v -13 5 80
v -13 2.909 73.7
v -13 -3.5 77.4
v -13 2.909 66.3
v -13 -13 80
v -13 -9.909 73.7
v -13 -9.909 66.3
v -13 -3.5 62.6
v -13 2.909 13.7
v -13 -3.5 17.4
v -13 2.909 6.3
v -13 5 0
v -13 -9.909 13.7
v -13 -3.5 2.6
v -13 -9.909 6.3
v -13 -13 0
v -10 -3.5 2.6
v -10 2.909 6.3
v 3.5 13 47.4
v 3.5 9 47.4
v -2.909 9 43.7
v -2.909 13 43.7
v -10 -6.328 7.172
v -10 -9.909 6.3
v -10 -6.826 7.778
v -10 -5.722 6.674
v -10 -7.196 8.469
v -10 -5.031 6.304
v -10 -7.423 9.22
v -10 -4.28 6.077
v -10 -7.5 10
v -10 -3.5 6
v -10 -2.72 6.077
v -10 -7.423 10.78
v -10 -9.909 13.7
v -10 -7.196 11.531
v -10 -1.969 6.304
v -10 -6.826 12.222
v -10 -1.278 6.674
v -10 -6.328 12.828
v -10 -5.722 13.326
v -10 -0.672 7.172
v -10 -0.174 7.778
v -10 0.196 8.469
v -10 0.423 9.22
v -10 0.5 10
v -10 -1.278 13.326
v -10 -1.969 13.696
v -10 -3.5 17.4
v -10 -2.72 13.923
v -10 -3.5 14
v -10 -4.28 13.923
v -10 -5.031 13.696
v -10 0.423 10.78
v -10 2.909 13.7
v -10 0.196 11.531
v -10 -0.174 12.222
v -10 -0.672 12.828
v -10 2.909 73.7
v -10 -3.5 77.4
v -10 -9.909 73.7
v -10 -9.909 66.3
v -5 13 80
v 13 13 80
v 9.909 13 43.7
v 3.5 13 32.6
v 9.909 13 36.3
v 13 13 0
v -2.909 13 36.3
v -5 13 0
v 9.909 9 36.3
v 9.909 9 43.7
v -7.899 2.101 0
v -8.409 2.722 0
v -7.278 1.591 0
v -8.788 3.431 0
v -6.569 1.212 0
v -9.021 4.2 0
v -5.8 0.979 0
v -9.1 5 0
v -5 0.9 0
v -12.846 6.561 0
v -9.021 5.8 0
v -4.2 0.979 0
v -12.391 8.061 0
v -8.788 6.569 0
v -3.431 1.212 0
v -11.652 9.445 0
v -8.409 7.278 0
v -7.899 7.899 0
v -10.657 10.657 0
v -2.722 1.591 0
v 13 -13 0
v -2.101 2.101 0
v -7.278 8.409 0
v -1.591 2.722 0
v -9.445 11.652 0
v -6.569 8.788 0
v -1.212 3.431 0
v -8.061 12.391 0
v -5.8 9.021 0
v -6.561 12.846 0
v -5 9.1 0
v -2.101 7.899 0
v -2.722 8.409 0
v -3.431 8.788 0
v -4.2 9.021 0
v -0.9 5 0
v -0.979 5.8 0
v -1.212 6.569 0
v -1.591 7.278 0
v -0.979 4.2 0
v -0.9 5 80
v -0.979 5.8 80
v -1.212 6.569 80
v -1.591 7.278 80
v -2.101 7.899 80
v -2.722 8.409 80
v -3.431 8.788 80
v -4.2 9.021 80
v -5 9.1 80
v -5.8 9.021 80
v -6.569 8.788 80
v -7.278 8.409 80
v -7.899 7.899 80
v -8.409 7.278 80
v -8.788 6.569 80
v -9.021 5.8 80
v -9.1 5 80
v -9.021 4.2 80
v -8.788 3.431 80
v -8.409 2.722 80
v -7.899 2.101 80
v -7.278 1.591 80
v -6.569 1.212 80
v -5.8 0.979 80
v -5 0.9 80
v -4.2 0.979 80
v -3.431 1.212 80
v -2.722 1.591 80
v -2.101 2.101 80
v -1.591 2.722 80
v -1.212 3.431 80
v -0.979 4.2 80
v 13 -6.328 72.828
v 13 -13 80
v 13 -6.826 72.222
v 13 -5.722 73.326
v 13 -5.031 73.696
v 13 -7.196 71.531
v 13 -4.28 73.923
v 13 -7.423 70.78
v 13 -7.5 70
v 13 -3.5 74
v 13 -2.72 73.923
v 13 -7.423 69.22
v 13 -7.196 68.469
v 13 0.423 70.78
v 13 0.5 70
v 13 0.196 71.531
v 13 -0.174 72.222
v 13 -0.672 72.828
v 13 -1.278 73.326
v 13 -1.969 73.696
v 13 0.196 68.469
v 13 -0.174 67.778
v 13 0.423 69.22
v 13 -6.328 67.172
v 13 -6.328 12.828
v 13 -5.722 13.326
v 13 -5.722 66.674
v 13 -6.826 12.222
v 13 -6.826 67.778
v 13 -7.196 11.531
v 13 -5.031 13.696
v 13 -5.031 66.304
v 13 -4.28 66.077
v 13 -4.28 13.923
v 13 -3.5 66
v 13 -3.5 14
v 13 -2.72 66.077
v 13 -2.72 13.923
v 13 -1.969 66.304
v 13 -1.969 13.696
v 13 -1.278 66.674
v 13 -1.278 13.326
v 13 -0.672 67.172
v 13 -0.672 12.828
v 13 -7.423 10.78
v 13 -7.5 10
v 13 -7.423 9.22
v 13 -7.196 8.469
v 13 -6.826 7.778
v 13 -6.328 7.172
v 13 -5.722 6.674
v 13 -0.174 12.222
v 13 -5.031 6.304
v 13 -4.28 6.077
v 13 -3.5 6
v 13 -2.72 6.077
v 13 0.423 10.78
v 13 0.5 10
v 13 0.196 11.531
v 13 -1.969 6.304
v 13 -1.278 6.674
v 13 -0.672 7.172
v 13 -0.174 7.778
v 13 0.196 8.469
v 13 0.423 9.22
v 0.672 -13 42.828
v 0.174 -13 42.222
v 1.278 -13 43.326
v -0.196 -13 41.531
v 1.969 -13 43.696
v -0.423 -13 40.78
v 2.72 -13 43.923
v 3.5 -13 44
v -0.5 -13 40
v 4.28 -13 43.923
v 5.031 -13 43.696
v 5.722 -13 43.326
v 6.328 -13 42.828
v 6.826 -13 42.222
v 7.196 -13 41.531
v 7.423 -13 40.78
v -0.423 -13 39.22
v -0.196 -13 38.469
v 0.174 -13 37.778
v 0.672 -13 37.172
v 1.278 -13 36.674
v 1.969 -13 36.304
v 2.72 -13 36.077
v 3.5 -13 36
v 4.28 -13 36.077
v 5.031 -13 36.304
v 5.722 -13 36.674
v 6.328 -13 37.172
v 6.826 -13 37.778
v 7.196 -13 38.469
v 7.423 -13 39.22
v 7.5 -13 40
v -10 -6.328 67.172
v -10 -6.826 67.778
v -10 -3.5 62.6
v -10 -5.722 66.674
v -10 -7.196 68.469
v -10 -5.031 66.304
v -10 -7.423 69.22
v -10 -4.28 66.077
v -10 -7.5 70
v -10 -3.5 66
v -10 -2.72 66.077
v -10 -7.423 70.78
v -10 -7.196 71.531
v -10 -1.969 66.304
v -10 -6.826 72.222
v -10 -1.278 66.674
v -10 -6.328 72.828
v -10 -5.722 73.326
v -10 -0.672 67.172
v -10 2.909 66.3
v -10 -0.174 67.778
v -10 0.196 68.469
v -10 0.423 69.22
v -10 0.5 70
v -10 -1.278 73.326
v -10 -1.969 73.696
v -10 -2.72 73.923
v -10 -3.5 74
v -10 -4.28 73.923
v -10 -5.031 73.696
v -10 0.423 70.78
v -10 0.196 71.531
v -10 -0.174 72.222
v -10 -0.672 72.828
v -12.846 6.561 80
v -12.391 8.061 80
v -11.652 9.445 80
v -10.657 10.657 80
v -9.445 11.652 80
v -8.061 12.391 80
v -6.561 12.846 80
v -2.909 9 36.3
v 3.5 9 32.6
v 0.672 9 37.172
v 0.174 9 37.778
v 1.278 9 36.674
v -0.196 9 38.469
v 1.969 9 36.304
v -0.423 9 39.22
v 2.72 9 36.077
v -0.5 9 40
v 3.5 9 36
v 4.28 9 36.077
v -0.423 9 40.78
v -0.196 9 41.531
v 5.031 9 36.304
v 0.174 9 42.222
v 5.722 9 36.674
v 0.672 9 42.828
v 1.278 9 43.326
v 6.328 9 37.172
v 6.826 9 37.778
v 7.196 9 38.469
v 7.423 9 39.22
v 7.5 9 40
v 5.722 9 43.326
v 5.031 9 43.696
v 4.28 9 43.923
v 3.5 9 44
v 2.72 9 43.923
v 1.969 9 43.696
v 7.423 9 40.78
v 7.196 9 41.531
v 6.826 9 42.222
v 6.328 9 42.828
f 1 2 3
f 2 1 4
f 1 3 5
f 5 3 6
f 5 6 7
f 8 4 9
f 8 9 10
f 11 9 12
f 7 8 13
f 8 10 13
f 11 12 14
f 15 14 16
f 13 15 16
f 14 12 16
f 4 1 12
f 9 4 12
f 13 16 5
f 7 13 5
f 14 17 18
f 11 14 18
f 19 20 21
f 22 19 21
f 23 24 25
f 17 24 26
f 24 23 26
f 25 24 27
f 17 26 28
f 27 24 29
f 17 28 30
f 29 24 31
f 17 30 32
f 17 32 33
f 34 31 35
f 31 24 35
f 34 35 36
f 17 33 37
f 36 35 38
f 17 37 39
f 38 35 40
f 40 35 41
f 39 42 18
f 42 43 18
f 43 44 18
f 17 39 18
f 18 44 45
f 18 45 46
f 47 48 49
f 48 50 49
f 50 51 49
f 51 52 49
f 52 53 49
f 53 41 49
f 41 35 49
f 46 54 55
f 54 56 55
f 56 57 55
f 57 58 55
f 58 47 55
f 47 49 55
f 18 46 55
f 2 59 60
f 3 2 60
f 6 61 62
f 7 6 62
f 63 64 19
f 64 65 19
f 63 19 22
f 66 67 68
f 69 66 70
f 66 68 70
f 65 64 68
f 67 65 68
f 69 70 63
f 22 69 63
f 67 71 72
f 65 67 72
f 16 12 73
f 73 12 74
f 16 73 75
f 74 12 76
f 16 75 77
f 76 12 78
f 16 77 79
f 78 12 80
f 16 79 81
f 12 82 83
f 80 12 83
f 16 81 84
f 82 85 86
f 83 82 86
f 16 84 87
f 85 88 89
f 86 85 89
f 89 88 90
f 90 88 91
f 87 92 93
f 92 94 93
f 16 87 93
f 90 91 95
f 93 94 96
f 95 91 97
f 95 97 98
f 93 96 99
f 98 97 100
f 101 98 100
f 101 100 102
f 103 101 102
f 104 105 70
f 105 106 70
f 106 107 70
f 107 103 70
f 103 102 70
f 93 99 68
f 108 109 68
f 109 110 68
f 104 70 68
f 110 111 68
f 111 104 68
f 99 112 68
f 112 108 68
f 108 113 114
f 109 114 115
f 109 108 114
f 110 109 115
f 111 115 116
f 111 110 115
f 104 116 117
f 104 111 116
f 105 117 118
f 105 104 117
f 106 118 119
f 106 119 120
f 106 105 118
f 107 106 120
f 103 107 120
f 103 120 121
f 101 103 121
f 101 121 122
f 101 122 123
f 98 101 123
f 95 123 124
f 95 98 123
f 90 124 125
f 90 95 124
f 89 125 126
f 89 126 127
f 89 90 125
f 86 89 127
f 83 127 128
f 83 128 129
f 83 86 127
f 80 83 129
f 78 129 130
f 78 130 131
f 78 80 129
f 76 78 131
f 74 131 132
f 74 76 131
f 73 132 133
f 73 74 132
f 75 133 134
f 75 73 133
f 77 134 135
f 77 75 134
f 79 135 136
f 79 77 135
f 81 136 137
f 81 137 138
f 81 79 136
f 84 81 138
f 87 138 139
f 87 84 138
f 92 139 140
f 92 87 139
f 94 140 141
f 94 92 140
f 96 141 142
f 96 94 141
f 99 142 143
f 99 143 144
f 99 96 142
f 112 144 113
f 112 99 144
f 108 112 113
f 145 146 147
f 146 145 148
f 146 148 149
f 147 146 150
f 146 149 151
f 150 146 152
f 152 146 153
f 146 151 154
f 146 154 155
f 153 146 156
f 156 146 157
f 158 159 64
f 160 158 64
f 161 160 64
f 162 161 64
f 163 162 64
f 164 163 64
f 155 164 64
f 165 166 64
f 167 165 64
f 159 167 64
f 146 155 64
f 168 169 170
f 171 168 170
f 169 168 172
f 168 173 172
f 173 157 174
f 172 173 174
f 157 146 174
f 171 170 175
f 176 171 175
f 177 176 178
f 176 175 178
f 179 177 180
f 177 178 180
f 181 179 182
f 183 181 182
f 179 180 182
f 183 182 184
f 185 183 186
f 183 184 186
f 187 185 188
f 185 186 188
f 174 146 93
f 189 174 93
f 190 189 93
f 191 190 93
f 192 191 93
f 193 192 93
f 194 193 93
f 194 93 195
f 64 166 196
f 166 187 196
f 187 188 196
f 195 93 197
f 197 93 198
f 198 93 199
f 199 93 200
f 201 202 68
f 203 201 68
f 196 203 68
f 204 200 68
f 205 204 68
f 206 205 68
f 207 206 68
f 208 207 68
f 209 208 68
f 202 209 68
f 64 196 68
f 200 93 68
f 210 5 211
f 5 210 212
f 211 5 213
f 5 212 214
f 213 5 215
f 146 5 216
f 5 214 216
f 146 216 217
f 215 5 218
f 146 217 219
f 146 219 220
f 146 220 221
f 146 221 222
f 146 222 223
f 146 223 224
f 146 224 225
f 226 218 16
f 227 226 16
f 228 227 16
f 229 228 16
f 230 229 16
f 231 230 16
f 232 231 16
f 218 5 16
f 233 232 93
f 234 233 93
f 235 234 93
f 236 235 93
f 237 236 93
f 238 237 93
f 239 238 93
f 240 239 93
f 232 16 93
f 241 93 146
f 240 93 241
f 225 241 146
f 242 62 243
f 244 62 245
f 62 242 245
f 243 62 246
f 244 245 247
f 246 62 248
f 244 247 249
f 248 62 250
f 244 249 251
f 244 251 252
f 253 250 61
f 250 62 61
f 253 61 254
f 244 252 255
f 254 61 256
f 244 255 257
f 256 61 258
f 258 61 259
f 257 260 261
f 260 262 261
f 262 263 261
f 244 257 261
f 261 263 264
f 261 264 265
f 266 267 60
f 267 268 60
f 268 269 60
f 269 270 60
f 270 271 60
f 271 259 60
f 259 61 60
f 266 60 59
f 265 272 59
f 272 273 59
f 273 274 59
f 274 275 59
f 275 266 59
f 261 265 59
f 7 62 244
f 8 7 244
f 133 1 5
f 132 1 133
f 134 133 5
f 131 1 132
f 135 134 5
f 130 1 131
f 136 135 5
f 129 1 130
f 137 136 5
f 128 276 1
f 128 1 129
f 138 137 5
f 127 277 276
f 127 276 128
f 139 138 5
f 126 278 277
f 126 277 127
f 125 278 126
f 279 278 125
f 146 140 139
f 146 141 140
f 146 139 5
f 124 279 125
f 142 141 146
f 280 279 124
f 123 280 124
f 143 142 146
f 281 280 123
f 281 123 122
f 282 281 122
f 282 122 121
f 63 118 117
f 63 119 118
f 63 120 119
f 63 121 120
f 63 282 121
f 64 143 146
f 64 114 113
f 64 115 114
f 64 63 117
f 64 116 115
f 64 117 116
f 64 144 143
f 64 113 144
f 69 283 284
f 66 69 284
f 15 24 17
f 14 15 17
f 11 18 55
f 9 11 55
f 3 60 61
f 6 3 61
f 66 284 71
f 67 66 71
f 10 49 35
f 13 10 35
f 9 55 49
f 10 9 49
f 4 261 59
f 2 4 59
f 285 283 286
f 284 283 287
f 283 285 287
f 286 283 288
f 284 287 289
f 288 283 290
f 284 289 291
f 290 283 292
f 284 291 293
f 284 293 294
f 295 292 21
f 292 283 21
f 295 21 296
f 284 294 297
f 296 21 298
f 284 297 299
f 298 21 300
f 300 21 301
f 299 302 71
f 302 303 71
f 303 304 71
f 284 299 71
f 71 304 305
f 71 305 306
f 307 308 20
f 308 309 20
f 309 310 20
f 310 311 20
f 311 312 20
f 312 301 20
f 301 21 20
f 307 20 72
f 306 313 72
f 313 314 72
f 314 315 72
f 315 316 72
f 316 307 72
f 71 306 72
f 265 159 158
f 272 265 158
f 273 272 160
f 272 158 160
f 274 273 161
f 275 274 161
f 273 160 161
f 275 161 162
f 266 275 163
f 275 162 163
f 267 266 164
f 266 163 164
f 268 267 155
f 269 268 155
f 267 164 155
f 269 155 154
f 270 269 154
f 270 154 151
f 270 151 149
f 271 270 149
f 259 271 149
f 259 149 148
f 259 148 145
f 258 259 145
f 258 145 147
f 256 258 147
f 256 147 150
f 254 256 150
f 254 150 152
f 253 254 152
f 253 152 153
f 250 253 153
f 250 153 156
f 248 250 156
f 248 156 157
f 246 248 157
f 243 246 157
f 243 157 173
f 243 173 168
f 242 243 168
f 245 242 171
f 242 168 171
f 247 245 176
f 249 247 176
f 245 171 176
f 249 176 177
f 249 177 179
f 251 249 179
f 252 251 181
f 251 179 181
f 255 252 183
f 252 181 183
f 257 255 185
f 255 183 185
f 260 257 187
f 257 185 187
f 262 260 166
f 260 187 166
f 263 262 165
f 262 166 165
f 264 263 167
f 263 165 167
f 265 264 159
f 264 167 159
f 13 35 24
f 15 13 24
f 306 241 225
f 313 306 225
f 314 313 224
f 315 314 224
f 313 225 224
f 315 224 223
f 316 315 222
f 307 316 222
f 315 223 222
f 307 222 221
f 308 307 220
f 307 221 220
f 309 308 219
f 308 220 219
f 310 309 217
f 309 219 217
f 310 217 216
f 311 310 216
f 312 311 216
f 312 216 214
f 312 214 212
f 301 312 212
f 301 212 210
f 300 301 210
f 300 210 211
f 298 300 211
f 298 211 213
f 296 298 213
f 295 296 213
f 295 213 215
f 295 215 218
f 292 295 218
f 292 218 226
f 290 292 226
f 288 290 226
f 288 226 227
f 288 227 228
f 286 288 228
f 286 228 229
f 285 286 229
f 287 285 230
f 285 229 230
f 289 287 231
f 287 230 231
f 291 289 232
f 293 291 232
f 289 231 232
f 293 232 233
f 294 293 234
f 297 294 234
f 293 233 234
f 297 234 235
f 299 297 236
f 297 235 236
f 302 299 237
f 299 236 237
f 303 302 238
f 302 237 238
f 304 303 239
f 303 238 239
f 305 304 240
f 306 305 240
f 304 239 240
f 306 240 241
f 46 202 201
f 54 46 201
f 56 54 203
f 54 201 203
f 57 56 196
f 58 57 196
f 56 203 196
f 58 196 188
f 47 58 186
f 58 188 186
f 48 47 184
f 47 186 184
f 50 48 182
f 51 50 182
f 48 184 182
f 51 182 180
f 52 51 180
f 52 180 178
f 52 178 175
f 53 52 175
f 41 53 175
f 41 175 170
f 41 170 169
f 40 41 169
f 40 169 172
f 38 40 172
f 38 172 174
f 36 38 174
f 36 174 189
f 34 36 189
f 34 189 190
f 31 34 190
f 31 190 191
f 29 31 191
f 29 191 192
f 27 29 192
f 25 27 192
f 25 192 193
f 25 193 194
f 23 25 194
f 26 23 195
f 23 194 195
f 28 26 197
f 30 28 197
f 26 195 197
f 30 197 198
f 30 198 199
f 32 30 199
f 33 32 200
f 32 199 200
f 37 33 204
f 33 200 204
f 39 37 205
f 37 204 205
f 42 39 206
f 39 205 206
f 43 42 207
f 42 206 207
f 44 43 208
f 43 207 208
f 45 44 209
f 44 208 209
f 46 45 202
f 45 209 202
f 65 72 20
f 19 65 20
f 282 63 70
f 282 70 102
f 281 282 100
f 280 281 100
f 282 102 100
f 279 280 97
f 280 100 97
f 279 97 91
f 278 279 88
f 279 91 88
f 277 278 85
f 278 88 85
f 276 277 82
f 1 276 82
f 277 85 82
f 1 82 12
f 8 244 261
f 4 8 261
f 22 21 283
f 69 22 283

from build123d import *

# Parameters (mm, degrees)
SKETCH007_R  = 4
PAD003_DEPTH = 31
SKETCH001_R  = 4
PAD004_DEPTH = 31
PAD006_DEPTH = 4
PAD001_DEPTH = 4
SKETCH_R     = 4.1
PAD_DEPTH    = 80


with BuildPart() as rodhole01:
    # Sketch007 → Pad003 (new body)
    with BuildSketch(Plane.XZ.offset(16)):
        with Locations((3.5, 40)):
            Circle(SKETCH007_R)
    extrude(amount=-PAD003_DEPTH)


with BuildPart() as rodhole02:
    # Sketch001 → Pad004 (new body)
    with BuildSketch(Plane.YZ.offset(15.5)):
        with Locations((-3.5, 70)):
            Circle(SKETCH001_R)
        with Locations((-3.5, 10)):
            Circle(SKETCH001_R)
    extrude(amount=-PAD004_DEPTH)


with BuildPart() as sidenutflush02:
    # Sketch002 → Pad006 (new body)
    with BuildSketch(Plane.YZ.offset(-10)):
        Polygon((2.908588, 66.3), (2.908588, 73.7), (-3.5, 77.4), (-9.908588, 73.7), (-9.908588, 66.3), (-3.5, 62.6), align=None)
        Polygon((-3.5, 2.6), (2.908588, 6.3), (2.908588, 13.7), (-3.5, 17.4), (-9.908588, 13.7), (-9.908588, 6.3), align=None)
    extrude(amount=-PAD006_DEPTH)


with BuildPart() as cutblock:
    # Sketch008 → Pad001 (new body)
    with BuildSketch(Plane.XZ.offset(-9)):
        Polygon((9.908588, 36.3), (9.908588, 43.7), (3.5, 47.4), (-2.908588, 43.7), (-2.908588, 36.3), (3.5, 32.6), align=None)
    extrude(amount=-PAD001_DEPTH)

    # Fusion: union RodHole01, RodHole02, SideNutFlush02
    add(rodhole01.part)
    add(rodhole02.part)
    add(sidenutflush02.part)


with BuildPart() as cut:
    # Sketch → Pad (new body)
    with BuildSketch(Plane.XY):
        with BuildLine():
            Line((-13.000011, 5.000021), (-13.000011, -13))
            Line((-13.000011, -13), (13.000011, -13))
            Line((13.000011, -13), (13.000011, 13))
            Line((13.000011, 13), (-5.00001, 13))
            ThreePointArc((-5.00001, 13), (-10.656858, 10.656862), (-13.000011, 5.000021))
        make_face()
        with Locations((-5.000011, 5)):
            Circle(SKETCH_R, mode=Mode.SUBTRACT)
    extrude(amount=PAD_DEPTH)

    # Cut: cut CutBlock
    add(cutblock.part, mode=Mode.SUBTRACT)


solid = cut.part
